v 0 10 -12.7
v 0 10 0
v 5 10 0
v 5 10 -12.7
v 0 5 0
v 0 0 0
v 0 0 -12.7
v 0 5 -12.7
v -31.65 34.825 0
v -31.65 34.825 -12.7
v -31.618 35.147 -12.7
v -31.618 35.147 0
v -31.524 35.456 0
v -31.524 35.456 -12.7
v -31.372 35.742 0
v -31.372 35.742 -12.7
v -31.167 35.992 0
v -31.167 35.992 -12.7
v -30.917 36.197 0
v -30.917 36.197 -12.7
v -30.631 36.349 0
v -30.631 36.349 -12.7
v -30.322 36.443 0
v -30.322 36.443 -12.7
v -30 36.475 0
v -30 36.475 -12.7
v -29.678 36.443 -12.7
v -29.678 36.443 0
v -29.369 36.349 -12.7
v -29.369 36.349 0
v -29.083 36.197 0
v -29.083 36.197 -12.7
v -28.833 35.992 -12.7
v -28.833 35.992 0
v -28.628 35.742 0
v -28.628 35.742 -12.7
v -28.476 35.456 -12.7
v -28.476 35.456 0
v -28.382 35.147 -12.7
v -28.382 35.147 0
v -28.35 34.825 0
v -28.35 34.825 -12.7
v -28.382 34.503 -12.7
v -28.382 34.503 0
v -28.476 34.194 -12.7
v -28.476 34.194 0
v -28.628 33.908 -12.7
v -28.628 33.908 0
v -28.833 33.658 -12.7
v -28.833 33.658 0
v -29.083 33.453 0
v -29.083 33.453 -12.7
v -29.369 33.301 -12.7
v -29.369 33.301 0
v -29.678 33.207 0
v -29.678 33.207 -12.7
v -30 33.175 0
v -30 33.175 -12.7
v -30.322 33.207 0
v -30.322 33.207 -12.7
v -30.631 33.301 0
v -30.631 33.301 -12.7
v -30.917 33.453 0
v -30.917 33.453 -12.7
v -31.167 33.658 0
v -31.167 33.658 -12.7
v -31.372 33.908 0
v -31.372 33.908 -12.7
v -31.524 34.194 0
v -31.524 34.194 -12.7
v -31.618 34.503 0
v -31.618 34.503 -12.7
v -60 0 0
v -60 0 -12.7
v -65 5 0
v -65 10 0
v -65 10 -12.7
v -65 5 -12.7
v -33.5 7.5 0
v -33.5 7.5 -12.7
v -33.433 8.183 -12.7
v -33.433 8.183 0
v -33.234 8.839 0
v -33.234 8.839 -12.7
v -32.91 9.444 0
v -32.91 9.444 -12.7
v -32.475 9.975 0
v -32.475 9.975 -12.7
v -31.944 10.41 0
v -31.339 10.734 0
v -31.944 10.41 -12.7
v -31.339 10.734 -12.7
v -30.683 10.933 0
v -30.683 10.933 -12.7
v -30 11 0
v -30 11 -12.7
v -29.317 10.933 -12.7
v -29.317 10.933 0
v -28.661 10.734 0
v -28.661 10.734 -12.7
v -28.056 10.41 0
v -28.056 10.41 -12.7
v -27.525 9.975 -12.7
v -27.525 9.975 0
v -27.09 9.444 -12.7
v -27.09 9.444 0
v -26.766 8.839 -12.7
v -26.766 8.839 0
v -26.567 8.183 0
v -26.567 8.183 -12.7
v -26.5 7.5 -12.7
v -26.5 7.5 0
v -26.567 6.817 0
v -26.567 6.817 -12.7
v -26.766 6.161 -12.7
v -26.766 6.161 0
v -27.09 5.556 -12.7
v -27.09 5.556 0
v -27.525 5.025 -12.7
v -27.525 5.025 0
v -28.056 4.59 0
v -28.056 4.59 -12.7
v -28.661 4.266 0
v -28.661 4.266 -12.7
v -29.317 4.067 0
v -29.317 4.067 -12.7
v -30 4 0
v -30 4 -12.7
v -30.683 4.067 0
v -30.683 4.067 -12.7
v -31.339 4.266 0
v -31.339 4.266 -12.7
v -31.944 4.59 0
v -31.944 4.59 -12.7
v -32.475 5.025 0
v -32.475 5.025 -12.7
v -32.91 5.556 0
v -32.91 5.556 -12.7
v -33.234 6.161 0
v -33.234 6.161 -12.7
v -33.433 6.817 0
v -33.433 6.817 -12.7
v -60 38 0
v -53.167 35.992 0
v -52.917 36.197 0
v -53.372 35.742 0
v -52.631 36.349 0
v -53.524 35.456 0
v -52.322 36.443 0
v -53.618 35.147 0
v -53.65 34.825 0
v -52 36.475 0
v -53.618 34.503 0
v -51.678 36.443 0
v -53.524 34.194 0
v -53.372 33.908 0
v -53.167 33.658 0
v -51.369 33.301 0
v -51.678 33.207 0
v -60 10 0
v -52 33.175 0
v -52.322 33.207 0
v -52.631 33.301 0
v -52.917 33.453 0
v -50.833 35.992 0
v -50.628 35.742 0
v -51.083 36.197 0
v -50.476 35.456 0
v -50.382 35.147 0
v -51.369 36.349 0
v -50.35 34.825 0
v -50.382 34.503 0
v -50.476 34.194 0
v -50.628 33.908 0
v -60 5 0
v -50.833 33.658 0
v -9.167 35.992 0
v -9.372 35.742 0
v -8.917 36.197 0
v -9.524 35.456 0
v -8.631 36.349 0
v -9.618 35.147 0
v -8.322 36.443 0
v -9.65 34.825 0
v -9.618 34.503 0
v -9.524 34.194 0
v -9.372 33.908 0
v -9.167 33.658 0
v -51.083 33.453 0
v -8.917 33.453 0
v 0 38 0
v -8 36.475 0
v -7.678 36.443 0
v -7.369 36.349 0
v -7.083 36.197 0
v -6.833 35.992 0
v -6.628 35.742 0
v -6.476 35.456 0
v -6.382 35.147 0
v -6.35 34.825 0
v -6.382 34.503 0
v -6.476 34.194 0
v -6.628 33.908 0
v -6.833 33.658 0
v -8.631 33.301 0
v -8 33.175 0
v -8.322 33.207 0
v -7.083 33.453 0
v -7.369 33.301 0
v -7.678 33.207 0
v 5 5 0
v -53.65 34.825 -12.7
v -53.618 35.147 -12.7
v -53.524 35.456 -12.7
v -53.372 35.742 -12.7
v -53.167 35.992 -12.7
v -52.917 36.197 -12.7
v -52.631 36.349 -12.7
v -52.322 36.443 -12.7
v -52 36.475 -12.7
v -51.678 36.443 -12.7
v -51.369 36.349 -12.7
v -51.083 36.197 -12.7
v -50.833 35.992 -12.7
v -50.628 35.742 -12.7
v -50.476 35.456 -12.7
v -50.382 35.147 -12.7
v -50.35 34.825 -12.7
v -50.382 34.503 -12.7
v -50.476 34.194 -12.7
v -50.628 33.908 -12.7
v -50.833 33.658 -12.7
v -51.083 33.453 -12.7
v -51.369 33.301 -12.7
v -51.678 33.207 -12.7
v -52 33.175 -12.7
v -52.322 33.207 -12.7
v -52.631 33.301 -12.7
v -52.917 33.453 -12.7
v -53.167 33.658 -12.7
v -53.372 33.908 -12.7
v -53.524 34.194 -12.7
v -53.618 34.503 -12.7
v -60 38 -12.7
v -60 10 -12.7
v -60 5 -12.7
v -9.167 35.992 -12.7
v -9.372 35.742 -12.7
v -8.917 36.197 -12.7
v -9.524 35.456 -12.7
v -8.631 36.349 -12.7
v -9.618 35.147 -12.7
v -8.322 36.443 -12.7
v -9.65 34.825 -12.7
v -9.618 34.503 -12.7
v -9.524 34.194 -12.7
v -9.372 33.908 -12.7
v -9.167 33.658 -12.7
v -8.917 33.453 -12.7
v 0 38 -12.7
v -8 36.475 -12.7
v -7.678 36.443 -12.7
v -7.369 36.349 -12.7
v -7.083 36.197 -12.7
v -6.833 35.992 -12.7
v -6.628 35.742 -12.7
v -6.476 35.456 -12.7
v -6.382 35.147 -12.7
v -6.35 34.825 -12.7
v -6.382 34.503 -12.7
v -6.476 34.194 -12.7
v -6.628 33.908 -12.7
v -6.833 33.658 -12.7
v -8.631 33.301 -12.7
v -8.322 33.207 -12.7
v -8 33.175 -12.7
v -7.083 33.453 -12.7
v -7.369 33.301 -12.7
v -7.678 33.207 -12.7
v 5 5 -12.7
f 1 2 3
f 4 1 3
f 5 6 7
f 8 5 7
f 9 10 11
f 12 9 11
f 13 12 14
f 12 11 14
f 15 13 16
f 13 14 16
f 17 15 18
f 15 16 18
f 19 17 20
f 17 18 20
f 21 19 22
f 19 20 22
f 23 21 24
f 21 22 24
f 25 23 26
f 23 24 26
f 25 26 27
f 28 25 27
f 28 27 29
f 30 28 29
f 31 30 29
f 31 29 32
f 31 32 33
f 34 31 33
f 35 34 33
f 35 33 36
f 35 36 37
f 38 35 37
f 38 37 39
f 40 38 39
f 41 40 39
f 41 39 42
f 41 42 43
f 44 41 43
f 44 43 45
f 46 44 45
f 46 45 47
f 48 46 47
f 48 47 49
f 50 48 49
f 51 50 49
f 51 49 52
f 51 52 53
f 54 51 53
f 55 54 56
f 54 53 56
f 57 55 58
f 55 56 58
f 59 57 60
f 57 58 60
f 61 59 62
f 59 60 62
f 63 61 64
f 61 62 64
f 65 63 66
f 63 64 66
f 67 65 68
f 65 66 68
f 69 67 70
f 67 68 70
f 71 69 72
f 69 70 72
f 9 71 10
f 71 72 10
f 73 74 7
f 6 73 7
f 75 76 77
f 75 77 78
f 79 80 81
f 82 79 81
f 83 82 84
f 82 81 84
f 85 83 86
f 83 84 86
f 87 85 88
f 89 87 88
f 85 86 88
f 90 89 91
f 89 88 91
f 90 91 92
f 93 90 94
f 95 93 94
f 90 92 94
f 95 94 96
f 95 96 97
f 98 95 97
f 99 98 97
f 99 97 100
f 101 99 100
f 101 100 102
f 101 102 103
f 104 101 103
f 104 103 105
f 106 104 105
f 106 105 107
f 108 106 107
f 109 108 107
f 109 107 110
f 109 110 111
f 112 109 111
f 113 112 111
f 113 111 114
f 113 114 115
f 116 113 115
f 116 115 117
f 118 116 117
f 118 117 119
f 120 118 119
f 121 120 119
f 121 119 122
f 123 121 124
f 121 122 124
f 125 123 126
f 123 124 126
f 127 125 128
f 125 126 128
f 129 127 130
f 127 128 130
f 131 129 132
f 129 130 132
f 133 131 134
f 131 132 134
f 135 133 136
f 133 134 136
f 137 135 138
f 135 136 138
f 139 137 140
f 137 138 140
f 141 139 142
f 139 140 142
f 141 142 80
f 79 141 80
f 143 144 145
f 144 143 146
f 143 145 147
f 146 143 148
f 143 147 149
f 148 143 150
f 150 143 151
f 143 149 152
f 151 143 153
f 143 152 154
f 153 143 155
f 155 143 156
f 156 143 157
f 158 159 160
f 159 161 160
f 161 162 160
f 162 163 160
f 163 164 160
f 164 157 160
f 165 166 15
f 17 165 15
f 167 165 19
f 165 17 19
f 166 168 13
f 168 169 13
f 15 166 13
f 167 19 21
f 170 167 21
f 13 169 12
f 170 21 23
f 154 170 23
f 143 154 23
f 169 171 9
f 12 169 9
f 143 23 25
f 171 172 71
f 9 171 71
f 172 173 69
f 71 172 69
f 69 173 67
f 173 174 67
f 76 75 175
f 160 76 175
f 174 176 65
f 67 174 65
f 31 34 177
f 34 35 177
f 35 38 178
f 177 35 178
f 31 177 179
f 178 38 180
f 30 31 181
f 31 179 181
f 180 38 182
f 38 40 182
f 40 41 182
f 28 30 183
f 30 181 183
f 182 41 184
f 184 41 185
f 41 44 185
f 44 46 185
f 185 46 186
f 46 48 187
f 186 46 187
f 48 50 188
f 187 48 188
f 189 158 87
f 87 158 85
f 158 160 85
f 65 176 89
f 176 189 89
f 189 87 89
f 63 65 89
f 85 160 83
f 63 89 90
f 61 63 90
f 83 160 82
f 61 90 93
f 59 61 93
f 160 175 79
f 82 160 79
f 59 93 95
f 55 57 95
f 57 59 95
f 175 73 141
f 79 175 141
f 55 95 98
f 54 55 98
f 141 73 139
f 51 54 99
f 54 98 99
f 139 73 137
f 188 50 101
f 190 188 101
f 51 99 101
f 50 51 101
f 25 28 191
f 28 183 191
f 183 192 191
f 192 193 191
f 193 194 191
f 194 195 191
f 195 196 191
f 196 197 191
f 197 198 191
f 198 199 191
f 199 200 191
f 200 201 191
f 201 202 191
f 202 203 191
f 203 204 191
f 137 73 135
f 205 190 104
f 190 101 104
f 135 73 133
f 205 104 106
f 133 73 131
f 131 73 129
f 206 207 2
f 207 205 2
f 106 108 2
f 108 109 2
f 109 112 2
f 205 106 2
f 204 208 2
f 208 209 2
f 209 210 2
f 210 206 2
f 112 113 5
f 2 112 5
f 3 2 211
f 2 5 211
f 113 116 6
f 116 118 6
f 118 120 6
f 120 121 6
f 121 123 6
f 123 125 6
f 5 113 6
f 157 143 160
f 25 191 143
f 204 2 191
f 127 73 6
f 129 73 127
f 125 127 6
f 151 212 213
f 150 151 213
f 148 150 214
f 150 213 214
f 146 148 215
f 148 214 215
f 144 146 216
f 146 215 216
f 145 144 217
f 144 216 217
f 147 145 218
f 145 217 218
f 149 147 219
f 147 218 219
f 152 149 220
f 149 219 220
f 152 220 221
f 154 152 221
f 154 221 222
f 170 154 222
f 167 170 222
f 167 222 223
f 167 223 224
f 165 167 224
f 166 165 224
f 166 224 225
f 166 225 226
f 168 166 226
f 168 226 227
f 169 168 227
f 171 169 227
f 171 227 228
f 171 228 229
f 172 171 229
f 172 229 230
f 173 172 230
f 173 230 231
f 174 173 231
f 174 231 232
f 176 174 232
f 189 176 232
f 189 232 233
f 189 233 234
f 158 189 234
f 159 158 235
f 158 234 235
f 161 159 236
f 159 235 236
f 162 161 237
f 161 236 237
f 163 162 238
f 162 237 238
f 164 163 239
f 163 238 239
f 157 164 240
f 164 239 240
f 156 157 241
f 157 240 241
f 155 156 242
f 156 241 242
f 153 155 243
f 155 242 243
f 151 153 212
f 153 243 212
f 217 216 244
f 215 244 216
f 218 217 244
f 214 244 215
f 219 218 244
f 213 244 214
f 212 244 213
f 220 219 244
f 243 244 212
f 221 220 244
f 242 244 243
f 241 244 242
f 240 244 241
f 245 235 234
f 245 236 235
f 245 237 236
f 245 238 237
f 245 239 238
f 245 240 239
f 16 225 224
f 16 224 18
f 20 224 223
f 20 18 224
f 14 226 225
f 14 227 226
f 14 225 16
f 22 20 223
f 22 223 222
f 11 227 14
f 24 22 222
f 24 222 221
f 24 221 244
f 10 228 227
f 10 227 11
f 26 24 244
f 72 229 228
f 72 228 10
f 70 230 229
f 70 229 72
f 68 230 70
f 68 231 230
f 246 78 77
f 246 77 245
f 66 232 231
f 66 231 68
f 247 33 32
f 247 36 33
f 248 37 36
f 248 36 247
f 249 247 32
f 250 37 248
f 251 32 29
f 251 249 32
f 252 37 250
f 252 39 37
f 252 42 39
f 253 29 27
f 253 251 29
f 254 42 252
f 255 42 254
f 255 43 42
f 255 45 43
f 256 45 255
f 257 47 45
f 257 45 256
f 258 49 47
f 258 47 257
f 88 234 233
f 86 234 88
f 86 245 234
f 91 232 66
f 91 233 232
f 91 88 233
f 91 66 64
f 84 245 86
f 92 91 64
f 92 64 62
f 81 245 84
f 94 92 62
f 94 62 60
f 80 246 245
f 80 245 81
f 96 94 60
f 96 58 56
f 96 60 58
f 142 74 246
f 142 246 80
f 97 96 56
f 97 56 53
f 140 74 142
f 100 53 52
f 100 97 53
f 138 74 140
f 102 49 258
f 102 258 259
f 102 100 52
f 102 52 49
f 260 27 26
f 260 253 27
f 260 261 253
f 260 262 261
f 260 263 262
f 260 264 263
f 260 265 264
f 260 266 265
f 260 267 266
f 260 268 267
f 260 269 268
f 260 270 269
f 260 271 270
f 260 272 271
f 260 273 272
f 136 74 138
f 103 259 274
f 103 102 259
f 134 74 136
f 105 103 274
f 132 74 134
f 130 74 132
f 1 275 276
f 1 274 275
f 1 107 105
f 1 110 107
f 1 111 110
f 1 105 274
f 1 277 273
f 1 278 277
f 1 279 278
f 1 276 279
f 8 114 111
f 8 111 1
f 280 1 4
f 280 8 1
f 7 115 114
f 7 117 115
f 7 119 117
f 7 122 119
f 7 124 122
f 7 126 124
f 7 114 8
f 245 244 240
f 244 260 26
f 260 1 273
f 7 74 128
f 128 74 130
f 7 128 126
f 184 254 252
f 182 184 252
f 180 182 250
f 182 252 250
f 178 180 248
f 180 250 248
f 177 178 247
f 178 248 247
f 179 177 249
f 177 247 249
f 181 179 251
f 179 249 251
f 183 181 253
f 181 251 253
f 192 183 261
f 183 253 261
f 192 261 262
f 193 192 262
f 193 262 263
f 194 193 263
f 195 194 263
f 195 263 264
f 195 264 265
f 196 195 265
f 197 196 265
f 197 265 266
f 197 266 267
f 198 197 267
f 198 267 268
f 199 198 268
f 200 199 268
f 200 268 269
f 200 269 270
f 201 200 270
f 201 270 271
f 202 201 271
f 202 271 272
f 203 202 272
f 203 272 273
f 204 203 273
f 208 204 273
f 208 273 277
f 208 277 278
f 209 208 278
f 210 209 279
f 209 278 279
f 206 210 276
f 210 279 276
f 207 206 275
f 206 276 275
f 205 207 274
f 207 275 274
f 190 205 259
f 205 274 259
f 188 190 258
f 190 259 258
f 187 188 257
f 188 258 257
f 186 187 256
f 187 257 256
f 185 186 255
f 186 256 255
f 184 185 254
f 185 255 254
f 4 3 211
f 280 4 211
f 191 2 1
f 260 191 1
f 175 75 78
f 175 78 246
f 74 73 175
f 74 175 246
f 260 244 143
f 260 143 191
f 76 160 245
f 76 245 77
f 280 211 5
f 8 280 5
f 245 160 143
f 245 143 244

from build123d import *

# Parameters (mm, degrees)
SKETCH1_W                 = 60
SKETCH1_H                 = 12.7
BOSS_EXTRUDE1_DEPTH       = 38
M8X1_0_TAPPED_HOLE1_D     = 7
M8X1_0_TAPPED_HOLE1_DEPTH = 19.05
M8X1_0_TAPPED_HOLE1_TIP   = 2.103012167
BOSS_EXTRUDE3_DEPTH       = 12.7
M4X0_7_TAPPED_HOLE1_D     = 3.3


with BuildPart() as part:
    # Sketch1 → Boss-Extrude1 (new body)
    with BuildSketch(Plane(origin=(0, 0, 0), x_dir=(1, 0, 0), z_dir=(0, 1, 0))):
        with Locations((-30, 6.35)):
            Rectangle(SKETCH1_W, SKETCH1_H)
    extrude(amount=BOSS_EXTRUDE1_DEPTH)

    # M8x1.0 Tapped Hole1
    with Locations(Plane(origin=(-30, 7.5, 0), x_dir=(1, 0, 0), z_dir=(0, 0, 1))):
        with Locations((0, 0)):
            Hole(M8X1_0_TAPPED_HOLE1_D / 2, depth=M8X1_0_TAPPED_HOLE1_DEPTH)
            with Locations((0, 0, -(M8X1_0_TAPPED_HOLE1_DEPTH + M8X1_0_TAPPED_HOLE1_TIP / 2))):  # 118° drill point
                Cone(0, M8X1_0_TAPPED_HOLE1_D / 2, M8X1_0_TAPPED_HOLE1_TIP, mode=Mode.SUBTRACT)

    # Sketch7 → Boss-Extrude3 (add)
    with BuildSketch(Plane.XY):
        Polygon((-60, 7.5), (-60, 10), (-65, 10), (-65, 5), (-60, 5), align=None)
        Polygon((5, 5), (0, 5), (0, 7.5), (0, 10), (5, 10), align=None)
    extrude(amount=-BOSS_EXTRUDE3_DEPTH)

    # M4x0.7 Tapped Hole1 (through all)
    with Locations(Plane(origin=(-52, 34.825, 0), x_dir=(1, 0, 0), z_dir=(0, 0, 1))):
        with Locations((0, 0), (22, 0), (44, 0)):
            Hole(M4X0_7_TAPPED_HOLE1_D / 2)


solid = part.part
